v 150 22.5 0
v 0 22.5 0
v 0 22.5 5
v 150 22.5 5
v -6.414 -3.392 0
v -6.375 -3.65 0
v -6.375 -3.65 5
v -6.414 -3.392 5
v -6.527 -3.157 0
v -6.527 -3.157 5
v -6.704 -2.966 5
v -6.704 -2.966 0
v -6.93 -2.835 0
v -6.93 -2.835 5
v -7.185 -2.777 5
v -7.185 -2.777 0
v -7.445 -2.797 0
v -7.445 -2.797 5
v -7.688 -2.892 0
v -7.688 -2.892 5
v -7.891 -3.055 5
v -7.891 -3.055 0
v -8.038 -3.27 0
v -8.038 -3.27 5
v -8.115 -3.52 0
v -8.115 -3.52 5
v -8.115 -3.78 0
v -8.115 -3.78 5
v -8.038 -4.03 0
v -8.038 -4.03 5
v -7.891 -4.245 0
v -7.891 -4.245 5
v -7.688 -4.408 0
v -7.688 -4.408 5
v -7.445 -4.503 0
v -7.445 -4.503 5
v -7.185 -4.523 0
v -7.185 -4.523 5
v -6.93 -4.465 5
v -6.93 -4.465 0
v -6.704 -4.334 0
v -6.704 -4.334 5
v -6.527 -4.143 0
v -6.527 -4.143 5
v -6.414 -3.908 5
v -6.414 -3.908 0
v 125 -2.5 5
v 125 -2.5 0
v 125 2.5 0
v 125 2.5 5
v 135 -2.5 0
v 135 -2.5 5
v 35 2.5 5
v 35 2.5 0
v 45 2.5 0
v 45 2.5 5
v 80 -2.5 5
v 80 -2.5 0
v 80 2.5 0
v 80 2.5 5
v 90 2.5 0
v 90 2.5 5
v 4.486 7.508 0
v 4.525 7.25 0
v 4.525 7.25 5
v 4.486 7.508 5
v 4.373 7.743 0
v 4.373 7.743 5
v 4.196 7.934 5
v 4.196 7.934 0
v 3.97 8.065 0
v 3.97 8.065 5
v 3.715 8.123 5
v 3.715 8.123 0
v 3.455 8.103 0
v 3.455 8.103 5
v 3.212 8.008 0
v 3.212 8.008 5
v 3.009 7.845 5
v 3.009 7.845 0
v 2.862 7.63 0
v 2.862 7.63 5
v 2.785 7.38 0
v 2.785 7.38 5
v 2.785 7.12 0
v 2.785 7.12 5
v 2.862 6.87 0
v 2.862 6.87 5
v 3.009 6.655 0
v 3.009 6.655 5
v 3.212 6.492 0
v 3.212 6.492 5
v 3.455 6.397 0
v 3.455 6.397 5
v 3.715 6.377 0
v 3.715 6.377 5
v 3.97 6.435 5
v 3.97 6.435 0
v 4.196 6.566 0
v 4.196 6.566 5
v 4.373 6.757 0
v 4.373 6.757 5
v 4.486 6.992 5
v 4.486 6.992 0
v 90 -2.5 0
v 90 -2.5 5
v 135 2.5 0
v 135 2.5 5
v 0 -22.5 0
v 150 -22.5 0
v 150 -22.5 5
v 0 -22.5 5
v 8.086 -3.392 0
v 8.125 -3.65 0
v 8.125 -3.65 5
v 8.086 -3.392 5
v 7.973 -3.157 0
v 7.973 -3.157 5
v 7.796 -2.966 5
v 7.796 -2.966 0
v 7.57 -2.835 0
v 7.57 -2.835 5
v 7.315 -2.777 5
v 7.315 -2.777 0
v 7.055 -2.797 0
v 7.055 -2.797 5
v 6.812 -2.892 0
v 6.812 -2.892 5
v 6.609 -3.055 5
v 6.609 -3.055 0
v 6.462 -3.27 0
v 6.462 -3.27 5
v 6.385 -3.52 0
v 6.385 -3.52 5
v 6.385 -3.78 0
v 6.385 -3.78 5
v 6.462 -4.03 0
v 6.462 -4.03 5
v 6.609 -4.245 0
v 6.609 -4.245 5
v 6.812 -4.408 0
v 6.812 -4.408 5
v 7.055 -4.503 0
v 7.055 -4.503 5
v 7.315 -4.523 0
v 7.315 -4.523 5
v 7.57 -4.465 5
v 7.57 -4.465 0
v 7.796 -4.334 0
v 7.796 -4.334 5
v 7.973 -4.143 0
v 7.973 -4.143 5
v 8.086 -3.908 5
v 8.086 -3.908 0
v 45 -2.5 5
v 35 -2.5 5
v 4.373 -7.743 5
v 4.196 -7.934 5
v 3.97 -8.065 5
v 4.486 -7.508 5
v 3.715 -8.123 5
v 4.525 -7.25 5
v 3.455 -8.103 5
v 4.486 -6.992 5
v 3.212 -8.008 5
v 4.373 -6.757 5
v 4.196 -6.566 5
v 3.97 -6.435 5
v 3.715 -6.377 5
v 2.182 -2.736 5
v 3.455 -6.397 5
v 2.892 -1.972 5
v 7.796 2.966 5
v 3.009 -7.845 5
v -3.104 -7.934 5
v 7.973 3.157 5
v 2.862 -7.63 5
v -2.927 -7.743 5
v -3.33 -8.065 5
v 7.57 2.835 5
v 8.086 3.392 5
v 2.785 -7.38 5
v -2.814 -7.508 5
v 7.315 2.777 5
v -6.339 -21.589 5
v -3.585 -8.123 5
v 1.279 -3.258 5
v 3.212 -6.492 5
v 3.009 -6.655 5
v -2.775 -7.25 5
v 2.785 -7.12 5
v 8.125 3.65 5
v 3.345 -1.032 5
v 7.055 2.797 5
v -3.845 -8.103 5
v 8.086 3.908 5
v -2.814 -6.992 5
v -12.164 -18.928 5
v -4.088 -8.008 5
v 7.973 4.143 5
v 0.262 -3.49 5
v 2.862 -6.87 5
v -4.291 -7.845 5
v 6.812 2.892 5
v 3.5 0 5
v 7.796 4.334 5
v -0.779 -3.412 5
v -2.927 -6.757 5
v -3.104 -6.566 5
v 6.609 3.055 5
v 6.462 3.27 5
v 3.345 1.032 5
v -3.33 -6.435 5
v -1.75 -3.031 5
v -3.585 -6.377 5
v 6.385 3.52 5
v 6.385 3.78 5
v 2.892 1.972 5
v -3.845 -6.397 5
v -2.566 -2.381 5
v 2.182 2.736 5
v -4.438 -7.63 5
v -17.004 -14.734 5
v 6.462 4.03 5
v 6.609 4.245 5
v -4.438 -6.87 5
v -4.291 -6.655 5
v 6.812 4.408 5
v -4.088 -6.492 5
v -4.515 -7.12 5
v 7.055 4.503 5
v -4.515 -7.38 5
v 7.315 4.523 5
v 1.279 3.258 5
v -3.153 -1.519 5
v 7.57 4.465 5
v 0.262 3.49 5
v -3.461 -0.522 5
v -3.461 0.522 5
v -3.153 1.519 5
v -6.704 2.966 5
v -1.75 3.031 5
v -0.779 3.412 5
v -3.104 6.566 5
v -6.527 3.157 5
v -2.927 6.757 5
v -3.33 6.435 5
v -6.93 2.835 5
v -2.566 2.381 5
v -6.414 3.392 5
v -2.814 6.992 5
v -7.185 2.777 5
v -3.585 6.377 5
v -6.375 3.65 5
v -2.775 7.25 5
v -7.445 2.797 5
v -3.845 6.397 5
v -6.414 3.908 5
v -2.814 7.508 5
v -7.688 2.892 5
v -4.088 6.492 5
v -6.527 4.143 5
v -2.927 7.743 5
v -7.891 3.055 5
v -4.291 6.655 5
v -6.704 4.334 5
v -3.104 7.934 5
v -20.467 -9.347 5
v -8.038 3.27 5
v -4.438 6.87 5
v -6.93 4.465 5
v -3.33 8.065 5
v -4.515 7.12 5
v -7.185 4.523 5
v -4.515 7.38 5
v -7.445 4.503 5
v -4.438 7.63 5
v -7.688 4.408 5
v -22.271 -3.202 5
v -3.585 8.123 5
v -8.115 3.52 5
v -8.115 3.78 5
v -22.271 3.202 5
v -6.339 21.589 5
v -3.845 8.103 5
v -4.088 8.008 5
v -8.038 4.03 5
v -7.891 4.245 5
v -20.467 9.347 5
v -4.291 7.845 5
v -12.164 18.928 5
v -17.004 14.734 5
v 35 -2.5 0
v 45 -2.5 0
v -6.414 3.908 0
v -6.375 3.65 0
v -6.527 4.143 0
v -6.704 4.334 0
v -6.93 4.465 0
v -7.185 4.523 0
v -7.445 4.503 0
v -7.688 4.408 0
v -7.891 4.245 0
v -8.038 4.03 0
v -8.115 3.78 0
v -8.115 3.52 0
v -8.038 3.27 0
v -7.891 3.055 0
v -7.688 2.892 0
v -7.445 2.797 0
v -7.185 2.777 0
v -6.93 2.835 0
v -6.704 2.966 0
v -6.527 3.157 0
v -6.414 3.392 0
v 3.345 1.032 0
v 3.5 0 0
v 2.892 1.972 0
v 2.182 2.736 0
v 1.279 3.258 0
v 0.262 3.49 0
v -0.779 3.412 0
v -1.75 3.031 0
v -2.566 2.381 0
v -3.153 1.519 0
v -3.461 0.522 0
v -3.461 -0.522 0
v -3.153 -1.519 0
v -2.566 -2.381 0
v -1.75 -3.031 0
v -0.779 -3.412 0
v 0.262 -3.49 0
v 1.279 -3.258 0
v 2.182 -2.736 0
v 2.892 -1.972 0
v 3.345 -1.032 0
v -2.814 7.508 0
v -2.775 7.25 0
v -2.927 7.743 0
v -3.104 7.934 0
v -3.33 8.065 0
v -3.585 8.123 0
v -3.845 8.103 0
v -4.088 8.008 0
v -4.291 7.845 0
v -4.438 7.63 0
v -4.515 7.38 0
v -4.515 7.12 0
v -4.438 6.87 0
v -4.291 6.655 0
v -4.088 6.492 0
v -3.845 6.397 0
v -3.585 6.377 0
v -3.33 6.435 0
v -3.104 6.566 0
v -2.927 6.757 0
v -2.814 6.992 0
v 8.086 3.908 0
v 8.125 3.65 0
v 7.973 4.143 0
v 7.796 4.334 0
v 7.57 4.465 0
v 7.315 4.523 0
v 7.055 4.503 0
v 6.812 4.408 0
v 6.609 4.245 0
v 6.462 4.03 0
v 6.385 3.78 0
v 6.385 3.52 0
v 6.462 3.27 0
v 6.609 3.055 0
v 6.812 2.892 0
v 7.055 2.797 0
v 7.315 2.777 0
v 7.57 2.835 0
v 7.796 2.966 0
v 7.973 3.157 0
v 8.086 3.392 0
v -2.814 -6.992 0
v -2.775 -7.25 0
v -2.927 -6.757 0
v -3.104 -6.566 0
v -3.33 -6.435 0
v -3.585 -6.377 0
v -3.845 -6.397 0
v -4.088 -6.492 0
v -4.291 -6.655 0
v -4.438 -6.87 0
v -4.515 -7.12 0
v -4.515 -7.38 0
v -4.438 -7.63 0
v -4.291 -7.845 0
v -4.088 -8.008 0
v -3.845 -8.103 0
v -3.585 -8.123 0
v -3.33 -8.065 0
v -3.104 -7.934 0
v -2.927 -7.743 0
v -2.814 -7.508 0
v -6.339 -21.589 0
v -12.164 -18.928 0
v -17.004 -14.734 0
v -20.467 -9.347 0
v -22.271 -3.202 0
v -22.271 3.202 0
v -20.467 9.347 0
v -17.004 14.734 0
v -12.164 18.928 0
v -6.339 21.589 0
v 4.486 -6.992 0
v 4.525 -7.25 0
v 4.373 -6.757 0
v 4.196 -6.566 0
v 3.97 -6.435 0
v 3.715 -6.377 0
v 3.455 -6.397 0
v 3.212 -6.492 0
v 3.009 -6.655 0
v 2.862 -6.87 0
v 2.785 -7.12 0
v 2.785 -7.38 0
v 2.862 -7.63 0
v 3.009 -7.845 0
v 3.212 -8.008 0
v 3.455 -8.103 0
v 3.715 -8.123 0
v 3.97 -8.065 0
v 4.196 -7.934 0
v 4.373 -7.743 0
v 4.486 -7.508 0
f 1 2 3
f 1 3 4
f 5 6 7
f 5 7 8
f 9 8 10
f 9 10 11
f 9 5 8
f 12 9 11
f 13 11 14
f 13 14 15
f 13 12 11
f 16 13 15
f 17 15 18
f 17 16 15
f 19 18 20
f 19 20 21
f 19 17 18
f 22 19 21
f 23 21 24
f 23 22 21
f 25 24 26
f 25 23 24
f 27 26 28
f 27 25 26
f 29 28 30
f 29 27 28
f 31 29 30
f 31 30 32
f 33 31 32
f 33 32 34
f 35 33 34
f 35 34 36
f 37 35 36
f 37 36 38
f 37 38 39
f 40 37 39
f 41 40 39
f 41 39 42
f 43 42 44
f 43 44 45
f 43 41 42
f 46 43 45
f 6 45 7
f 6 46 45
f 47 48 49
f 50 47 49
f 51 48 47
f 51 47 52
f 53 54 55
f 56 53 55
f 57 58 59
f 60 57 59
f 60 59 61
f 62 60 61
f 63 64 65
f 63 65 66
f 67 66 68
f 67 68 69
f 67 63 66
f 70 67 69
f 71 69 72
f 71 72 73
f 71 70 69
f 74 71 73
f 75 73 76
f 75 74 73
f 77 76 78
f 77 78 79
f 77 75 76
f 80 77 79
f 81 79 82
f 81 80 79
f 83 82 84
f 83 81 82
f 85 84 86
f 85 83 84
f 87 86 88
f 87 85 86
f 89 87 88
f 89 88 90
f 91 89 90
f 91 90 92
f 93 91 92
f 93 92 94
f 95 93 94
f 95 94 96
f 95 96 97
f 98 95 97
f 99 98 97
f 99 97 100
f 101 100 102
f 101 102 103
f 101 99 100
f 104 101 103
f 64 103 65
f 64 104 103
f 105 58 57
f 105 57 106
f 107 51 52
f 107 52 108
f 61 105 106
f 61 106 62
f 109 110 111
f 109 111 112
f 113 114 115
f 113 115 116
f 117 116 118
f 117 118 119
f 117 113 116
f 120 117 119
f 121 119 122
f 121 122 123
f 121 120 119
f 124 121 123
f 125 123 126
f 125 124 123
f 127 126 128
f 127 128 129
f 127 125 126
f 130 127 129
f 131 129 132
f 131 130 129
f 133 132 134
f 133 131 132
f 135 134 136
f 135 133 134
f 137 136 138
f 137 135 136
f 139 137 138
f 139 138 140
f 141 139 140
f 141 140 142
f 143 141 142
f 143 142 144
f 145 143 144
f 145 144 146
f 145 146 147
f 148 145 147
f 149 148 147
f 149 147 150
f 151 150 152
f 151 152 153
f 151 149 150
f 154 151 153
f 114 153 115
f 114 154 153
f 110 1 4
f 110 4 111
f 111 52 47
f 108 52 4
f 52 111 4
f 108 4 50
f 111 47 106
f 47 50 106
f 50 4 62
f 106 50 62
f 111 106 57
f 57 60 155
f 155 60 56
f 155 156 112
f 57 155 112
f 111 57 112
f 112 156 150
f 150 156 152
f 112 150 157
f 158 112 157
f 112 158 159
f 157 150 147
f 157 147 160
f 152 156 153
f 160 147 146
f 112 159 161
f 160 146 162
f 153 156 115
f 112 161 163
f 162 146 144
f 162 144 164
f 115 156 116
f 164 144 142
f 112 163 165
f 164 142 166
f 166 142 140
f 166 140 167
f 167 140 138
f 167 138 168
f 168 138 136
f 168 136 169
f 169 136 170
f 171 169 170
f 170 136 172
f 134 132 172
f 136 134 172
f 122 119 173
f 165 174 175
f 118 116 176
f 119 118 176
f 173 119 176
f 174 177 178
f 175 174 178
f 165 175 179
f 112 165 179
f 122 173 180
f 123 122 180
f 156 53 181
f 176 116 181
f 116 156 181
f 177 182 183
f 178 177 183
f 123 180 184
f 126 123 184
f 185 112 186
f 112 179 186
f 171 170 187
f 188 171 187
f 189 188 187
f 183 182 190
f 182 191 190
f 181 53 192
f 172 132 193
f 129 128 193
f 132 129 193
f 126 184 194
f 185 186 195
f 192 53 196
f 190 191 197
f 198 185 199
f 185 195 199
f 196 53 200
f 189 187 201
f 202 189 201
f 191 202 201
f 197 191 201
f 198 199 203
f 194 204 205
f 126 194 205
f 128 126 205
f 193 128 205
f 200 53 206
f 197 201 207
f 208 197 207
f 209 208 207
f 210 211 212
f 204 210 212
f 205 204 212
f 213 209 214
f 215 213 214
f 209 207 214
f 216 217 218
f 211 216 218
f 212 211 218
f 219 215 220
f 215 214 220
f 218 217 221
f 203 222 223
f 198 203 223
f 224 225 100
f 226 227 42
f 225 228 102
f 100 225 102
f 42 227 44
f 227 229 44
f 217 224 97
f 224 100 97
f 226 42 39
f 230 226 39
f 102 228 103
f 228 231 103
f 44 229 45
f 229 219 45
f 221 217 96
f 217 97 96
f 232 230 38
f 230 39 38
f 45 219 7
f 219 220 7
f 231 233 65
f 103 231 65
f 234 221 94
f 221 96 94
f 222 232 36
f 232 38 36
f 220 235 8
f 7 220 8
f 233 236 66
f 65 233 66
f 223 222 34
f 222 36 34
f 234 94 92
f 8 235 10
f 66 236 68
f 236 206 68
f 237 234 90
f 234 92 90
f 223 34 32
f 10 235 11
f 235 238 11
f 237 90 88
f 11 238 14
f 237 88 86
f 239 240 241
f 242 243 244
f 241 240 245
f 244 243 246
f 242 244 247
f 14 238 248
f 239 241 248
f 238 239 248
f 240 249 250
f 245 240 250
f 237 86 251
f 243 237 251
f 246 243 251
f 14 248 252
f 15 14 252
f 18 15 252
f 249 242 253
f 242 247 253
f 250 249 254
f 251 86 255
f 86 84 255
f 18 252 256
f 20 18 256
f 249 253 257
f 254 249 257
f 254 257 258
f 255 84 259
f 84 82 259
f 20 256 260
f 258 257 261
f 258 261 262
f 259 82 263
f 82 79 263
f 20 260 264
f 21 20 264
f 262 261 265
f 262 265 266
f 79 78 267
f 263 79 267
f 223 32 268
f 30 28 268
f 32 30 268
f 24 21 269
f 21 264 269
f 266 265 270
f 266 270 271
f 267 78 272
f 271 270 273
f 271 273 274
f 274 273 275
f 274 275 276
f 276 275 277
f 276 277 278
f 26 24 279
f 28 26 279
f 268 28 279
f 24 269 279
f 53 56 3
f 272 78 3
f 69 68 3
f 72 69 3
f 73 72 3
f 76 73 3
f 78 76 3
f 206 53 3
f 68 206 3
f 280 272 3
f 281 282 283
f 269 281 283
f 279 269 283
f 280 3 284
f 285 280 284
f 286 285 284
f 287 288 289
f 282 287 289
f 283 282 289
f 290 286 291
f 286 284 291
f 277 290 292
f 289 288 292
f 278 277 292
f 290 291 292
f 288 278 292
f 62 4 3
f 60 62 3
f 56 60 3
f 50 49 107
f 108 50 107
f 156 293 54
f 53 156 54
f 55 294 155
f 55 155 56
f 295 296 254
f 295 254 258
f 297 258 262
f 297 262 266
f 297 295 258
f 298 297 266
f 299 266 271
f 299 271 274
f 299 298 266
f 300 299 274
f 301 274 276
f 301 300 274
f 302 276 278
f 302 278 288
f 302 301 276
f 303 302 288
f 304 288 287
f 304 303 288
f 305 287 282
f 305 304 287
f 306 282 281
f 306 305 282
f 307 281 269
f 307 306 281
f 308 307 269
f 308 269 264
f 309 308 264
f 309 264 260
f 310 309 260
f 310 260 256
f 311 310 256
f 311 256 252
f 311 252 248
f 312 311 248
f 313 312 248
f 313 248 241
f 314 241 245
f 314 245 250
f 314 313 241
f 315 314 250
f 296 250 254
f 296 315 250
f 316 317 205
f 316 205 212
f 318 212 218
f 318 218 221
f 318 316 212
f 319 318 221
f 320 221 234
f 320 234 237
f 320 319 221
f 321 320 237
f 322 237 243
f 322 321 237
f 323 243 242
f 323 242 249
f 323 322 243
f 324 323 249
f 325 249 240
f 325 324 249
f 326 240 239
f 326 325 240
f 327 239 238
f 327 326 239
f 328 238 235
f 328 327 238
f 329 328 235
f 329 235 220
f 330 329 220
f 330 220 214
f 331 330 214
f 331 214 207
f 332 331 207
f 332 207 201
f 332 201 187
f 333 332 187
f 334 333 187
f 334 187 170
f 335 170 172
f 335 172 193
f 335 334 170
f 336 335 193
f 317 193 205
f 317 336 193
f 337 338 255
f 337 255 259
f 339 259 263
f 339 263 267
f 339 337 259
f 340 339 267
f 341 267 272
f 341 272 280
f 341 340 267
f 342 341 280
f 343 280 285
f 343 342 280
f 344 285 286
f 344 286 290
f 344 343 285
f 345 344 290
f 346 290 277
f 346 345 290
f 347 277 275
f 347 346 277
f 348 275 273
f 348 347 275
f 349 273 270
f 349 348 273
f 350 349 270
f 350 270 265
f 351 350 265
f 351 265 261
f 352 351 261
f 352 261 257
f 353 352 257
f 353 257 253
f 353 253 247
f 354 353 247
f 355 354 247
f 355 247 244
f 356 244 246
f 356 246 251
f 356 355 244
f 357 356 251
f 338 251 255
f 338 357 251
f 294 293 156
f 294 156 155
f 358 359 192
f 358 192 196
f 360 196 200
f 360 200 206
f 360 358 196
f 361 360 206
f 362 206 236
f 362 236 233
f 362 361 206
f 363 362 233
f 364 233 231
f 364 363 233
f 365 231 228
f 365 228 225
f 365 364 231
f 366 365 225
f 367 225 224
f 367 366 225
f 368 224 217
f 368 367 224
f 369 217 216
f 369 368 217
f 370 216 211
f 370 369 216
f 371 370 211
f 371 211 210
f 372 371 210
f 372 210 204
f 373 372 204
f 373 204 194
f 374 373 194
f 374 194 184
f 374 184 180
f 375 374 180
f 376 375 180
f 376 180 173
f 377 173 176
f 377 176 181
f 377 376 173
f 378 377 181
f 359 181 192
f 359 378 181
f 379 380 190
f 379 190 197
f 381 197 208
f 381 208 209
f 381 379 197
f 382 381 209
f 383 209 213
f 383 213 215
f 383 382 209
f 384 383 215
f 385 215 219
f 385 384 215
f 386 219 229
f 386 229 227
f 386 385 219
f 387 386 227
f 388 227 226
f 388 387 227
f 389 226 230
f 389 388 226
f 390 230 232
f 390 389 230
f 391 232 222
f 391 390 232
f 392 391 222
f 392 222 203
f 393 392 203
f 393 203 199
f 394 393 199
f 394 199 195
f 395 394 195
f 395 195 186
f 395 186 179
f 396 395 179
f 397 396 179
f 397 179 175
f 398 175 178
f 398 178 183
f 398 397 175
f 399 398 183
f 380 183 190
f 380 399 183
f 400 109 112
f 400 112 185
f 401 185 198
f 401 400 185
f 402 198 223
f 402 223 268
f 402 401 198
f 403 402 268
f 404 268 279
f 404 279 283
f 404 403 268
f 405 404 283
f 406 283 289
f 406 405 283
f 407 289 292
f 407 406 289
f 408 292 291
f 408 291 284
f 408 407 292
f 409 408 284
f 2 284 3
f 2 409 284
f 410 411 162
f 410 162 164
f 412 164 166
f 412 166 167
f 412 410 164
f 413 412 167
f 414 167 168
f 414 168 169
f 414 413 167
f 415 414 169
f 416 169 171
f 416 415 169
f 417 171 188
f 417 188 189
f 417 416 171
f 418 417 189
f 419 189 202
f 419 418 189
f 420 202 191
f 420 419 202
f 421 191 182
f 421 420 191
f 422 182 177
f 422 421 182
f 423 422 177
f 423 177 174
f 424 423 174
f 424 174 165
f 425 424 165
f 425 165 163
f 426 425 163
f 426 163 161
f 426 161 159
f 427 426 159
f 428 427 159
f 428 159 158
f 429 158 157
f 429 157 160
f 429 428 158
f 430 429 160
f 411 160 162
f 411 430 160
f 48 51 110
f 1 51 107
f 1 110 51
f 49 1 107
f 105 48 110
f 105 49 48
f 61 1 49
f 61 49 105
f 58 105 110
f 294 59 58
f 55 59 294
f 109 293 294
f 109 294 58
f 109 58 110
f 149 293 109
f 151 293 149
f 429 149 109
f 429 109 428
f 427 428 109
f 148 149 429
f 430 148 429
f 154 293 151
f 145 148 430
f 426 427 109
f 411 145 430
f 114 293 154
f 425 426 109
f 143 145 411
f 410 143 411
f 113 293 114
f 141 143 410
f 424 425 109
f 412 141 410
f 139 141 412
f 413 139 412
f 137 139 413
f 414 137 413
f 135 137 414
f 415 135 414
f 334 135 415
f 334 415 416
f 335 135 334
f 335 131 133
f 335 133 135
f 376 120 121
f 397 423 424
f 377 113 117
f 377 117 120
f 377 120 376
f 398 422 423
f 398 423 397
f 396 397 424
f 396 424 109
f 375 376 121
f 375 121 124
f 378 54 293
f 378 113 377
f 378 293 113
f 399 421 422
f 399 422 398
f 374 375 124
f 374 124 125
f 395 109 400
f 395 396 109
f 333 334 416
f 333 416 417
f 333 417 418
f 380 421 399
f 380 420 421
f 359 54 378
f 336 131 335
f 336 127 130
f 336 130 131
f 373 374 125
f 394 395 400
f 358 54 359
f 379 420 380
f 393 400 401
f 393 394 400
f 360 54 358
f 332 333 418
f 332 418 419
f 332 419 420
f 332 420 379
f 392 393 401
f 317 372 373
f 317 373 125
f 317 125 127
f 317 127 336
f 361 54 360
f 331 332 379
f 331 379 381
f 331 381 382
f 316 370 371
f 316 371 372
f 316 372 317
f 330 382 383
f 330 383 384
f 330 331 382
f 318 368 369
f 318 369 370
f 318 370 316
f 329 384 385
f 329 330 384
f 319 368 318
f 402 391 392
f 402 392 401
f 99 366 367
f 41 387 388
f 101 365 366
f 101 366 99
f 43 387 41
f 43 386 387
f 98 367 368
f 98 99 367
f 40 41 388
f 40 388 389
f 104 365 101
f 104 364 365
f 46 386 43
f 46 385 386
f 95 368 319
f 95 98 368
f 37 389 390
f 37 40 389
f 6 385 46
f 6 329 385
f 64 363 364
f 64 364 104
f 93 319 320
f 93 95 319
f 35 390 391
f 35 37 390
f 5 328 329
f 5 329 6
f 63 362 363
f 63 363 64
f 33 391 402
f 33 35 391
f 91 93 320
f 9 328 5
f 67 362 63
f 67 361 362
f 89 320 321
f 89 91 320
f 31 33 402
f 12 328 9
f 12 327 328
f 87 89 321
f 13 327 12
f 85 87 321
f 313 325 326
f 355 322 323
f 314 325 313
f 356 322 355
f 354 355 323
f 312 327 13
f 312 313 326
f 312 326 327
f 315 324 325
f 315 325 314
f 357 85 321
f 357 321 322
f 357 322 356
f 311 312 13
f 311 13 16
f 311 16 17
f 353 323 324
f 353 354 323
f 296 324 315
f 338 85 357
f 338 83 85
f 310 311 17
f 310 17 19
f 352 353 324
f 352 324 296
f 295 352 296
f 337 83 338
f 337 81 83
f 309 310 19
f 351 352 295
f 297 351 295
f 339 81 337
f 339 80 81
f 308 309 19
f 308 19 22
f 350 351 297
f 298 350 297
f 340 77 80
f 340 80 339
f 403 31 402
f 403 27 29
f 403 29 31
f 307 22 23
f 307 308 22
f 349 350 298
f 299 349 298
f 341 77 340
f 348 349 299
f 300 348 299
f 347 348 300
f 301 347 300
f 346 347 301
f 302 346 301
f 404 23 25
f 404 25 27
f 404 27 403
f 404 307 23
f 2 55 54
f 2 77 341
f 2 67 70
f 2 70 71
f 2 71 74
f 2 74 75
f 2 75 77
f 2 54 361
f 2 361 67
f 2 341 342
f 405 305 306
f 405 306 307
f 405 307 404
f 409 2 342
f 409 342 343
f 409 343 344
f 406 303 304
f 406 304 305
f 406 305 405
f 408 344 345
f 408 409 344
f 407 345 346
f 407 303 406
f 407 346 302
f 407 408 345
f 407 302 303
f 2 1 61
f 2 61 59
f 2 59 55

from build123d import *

# Parameters (mm, degrees)
ESQUISSE1_R        = 0.875
ESQUISSE1_R_2      = 3.5
ESQUISSE1_W        = 10
ESQUISSE1_H        = 5
BOSS_EXTRU_1_DEPTH = 5


with BuildPart() as part:
    # Esquisse1 → Boss.-Extru.1 (new body)
    with BuildSketch(Plane.XY):
        with BuildLine():
            Line((150, 22.5), (0, 22.5))
            ThreePointArc((0, 22.5), (-22.5, 0), (0, -22.5))
            Line((0, -22.5), (150, -22.5))
            Line((150, -22.5), (150, 22.5))
        make_face()
        with Locations((-3.65, -7.25)):
            Circle(ESQUISSE1_R, mode=Mode.SUBTRACT)
        with Locations((3.65, -7.25)):
            Circle(ESQUISSE1_R, mode=Mode.SUBTRACT)
        with Locations((-7.25, -3.65)):
            Circle(ESQUISSE1_R, mode=Mode.SUBTRACT)
        with Locations((7.25, -3.65)):
            Circle(ESQUISSE1_R, mode=Mode.SUBTRACT)
        with Locations((-7.25, 3.65)):
            Circle(ESQUISSE1_R, mode=Mode.SUBTRACT)
        Circle(ESQUISSE1_R_2, mode=Mode.SUBTRACT)
        with Locations((7.25, 3.65)):
            Circle(ESQUISSE1_R, mode=Mode.SUBTRACT)
        with Locations((-3.65, 7.25)):
            Circle(ESQUISSE1_R, mode=Mode.SUBTRACT)
        with Locations((3.65, 7.25)):
            Circle(ESQUISSE1_R, mode=Mode.SUBTRACT)
        with Locations((40, 0)):
            Rectangle(ESQUISSE1_W, ESQUISSE1_H, mode=Mode.SUBTRACT)
        with Locations((85, 0)):
            Rectangle(ESQUISSE1_W, ESQUISSE1_H, mode=Mode.SUBTRACT)
        with Locations((130, 0)):
            Rectangle(ESQUISSE1_W, ESQUISSE1_H, mode=Mode.SUBTRACT)
    extrude(amount=BOSS_EXTRU_1_DEPTH)


solid = part.part
